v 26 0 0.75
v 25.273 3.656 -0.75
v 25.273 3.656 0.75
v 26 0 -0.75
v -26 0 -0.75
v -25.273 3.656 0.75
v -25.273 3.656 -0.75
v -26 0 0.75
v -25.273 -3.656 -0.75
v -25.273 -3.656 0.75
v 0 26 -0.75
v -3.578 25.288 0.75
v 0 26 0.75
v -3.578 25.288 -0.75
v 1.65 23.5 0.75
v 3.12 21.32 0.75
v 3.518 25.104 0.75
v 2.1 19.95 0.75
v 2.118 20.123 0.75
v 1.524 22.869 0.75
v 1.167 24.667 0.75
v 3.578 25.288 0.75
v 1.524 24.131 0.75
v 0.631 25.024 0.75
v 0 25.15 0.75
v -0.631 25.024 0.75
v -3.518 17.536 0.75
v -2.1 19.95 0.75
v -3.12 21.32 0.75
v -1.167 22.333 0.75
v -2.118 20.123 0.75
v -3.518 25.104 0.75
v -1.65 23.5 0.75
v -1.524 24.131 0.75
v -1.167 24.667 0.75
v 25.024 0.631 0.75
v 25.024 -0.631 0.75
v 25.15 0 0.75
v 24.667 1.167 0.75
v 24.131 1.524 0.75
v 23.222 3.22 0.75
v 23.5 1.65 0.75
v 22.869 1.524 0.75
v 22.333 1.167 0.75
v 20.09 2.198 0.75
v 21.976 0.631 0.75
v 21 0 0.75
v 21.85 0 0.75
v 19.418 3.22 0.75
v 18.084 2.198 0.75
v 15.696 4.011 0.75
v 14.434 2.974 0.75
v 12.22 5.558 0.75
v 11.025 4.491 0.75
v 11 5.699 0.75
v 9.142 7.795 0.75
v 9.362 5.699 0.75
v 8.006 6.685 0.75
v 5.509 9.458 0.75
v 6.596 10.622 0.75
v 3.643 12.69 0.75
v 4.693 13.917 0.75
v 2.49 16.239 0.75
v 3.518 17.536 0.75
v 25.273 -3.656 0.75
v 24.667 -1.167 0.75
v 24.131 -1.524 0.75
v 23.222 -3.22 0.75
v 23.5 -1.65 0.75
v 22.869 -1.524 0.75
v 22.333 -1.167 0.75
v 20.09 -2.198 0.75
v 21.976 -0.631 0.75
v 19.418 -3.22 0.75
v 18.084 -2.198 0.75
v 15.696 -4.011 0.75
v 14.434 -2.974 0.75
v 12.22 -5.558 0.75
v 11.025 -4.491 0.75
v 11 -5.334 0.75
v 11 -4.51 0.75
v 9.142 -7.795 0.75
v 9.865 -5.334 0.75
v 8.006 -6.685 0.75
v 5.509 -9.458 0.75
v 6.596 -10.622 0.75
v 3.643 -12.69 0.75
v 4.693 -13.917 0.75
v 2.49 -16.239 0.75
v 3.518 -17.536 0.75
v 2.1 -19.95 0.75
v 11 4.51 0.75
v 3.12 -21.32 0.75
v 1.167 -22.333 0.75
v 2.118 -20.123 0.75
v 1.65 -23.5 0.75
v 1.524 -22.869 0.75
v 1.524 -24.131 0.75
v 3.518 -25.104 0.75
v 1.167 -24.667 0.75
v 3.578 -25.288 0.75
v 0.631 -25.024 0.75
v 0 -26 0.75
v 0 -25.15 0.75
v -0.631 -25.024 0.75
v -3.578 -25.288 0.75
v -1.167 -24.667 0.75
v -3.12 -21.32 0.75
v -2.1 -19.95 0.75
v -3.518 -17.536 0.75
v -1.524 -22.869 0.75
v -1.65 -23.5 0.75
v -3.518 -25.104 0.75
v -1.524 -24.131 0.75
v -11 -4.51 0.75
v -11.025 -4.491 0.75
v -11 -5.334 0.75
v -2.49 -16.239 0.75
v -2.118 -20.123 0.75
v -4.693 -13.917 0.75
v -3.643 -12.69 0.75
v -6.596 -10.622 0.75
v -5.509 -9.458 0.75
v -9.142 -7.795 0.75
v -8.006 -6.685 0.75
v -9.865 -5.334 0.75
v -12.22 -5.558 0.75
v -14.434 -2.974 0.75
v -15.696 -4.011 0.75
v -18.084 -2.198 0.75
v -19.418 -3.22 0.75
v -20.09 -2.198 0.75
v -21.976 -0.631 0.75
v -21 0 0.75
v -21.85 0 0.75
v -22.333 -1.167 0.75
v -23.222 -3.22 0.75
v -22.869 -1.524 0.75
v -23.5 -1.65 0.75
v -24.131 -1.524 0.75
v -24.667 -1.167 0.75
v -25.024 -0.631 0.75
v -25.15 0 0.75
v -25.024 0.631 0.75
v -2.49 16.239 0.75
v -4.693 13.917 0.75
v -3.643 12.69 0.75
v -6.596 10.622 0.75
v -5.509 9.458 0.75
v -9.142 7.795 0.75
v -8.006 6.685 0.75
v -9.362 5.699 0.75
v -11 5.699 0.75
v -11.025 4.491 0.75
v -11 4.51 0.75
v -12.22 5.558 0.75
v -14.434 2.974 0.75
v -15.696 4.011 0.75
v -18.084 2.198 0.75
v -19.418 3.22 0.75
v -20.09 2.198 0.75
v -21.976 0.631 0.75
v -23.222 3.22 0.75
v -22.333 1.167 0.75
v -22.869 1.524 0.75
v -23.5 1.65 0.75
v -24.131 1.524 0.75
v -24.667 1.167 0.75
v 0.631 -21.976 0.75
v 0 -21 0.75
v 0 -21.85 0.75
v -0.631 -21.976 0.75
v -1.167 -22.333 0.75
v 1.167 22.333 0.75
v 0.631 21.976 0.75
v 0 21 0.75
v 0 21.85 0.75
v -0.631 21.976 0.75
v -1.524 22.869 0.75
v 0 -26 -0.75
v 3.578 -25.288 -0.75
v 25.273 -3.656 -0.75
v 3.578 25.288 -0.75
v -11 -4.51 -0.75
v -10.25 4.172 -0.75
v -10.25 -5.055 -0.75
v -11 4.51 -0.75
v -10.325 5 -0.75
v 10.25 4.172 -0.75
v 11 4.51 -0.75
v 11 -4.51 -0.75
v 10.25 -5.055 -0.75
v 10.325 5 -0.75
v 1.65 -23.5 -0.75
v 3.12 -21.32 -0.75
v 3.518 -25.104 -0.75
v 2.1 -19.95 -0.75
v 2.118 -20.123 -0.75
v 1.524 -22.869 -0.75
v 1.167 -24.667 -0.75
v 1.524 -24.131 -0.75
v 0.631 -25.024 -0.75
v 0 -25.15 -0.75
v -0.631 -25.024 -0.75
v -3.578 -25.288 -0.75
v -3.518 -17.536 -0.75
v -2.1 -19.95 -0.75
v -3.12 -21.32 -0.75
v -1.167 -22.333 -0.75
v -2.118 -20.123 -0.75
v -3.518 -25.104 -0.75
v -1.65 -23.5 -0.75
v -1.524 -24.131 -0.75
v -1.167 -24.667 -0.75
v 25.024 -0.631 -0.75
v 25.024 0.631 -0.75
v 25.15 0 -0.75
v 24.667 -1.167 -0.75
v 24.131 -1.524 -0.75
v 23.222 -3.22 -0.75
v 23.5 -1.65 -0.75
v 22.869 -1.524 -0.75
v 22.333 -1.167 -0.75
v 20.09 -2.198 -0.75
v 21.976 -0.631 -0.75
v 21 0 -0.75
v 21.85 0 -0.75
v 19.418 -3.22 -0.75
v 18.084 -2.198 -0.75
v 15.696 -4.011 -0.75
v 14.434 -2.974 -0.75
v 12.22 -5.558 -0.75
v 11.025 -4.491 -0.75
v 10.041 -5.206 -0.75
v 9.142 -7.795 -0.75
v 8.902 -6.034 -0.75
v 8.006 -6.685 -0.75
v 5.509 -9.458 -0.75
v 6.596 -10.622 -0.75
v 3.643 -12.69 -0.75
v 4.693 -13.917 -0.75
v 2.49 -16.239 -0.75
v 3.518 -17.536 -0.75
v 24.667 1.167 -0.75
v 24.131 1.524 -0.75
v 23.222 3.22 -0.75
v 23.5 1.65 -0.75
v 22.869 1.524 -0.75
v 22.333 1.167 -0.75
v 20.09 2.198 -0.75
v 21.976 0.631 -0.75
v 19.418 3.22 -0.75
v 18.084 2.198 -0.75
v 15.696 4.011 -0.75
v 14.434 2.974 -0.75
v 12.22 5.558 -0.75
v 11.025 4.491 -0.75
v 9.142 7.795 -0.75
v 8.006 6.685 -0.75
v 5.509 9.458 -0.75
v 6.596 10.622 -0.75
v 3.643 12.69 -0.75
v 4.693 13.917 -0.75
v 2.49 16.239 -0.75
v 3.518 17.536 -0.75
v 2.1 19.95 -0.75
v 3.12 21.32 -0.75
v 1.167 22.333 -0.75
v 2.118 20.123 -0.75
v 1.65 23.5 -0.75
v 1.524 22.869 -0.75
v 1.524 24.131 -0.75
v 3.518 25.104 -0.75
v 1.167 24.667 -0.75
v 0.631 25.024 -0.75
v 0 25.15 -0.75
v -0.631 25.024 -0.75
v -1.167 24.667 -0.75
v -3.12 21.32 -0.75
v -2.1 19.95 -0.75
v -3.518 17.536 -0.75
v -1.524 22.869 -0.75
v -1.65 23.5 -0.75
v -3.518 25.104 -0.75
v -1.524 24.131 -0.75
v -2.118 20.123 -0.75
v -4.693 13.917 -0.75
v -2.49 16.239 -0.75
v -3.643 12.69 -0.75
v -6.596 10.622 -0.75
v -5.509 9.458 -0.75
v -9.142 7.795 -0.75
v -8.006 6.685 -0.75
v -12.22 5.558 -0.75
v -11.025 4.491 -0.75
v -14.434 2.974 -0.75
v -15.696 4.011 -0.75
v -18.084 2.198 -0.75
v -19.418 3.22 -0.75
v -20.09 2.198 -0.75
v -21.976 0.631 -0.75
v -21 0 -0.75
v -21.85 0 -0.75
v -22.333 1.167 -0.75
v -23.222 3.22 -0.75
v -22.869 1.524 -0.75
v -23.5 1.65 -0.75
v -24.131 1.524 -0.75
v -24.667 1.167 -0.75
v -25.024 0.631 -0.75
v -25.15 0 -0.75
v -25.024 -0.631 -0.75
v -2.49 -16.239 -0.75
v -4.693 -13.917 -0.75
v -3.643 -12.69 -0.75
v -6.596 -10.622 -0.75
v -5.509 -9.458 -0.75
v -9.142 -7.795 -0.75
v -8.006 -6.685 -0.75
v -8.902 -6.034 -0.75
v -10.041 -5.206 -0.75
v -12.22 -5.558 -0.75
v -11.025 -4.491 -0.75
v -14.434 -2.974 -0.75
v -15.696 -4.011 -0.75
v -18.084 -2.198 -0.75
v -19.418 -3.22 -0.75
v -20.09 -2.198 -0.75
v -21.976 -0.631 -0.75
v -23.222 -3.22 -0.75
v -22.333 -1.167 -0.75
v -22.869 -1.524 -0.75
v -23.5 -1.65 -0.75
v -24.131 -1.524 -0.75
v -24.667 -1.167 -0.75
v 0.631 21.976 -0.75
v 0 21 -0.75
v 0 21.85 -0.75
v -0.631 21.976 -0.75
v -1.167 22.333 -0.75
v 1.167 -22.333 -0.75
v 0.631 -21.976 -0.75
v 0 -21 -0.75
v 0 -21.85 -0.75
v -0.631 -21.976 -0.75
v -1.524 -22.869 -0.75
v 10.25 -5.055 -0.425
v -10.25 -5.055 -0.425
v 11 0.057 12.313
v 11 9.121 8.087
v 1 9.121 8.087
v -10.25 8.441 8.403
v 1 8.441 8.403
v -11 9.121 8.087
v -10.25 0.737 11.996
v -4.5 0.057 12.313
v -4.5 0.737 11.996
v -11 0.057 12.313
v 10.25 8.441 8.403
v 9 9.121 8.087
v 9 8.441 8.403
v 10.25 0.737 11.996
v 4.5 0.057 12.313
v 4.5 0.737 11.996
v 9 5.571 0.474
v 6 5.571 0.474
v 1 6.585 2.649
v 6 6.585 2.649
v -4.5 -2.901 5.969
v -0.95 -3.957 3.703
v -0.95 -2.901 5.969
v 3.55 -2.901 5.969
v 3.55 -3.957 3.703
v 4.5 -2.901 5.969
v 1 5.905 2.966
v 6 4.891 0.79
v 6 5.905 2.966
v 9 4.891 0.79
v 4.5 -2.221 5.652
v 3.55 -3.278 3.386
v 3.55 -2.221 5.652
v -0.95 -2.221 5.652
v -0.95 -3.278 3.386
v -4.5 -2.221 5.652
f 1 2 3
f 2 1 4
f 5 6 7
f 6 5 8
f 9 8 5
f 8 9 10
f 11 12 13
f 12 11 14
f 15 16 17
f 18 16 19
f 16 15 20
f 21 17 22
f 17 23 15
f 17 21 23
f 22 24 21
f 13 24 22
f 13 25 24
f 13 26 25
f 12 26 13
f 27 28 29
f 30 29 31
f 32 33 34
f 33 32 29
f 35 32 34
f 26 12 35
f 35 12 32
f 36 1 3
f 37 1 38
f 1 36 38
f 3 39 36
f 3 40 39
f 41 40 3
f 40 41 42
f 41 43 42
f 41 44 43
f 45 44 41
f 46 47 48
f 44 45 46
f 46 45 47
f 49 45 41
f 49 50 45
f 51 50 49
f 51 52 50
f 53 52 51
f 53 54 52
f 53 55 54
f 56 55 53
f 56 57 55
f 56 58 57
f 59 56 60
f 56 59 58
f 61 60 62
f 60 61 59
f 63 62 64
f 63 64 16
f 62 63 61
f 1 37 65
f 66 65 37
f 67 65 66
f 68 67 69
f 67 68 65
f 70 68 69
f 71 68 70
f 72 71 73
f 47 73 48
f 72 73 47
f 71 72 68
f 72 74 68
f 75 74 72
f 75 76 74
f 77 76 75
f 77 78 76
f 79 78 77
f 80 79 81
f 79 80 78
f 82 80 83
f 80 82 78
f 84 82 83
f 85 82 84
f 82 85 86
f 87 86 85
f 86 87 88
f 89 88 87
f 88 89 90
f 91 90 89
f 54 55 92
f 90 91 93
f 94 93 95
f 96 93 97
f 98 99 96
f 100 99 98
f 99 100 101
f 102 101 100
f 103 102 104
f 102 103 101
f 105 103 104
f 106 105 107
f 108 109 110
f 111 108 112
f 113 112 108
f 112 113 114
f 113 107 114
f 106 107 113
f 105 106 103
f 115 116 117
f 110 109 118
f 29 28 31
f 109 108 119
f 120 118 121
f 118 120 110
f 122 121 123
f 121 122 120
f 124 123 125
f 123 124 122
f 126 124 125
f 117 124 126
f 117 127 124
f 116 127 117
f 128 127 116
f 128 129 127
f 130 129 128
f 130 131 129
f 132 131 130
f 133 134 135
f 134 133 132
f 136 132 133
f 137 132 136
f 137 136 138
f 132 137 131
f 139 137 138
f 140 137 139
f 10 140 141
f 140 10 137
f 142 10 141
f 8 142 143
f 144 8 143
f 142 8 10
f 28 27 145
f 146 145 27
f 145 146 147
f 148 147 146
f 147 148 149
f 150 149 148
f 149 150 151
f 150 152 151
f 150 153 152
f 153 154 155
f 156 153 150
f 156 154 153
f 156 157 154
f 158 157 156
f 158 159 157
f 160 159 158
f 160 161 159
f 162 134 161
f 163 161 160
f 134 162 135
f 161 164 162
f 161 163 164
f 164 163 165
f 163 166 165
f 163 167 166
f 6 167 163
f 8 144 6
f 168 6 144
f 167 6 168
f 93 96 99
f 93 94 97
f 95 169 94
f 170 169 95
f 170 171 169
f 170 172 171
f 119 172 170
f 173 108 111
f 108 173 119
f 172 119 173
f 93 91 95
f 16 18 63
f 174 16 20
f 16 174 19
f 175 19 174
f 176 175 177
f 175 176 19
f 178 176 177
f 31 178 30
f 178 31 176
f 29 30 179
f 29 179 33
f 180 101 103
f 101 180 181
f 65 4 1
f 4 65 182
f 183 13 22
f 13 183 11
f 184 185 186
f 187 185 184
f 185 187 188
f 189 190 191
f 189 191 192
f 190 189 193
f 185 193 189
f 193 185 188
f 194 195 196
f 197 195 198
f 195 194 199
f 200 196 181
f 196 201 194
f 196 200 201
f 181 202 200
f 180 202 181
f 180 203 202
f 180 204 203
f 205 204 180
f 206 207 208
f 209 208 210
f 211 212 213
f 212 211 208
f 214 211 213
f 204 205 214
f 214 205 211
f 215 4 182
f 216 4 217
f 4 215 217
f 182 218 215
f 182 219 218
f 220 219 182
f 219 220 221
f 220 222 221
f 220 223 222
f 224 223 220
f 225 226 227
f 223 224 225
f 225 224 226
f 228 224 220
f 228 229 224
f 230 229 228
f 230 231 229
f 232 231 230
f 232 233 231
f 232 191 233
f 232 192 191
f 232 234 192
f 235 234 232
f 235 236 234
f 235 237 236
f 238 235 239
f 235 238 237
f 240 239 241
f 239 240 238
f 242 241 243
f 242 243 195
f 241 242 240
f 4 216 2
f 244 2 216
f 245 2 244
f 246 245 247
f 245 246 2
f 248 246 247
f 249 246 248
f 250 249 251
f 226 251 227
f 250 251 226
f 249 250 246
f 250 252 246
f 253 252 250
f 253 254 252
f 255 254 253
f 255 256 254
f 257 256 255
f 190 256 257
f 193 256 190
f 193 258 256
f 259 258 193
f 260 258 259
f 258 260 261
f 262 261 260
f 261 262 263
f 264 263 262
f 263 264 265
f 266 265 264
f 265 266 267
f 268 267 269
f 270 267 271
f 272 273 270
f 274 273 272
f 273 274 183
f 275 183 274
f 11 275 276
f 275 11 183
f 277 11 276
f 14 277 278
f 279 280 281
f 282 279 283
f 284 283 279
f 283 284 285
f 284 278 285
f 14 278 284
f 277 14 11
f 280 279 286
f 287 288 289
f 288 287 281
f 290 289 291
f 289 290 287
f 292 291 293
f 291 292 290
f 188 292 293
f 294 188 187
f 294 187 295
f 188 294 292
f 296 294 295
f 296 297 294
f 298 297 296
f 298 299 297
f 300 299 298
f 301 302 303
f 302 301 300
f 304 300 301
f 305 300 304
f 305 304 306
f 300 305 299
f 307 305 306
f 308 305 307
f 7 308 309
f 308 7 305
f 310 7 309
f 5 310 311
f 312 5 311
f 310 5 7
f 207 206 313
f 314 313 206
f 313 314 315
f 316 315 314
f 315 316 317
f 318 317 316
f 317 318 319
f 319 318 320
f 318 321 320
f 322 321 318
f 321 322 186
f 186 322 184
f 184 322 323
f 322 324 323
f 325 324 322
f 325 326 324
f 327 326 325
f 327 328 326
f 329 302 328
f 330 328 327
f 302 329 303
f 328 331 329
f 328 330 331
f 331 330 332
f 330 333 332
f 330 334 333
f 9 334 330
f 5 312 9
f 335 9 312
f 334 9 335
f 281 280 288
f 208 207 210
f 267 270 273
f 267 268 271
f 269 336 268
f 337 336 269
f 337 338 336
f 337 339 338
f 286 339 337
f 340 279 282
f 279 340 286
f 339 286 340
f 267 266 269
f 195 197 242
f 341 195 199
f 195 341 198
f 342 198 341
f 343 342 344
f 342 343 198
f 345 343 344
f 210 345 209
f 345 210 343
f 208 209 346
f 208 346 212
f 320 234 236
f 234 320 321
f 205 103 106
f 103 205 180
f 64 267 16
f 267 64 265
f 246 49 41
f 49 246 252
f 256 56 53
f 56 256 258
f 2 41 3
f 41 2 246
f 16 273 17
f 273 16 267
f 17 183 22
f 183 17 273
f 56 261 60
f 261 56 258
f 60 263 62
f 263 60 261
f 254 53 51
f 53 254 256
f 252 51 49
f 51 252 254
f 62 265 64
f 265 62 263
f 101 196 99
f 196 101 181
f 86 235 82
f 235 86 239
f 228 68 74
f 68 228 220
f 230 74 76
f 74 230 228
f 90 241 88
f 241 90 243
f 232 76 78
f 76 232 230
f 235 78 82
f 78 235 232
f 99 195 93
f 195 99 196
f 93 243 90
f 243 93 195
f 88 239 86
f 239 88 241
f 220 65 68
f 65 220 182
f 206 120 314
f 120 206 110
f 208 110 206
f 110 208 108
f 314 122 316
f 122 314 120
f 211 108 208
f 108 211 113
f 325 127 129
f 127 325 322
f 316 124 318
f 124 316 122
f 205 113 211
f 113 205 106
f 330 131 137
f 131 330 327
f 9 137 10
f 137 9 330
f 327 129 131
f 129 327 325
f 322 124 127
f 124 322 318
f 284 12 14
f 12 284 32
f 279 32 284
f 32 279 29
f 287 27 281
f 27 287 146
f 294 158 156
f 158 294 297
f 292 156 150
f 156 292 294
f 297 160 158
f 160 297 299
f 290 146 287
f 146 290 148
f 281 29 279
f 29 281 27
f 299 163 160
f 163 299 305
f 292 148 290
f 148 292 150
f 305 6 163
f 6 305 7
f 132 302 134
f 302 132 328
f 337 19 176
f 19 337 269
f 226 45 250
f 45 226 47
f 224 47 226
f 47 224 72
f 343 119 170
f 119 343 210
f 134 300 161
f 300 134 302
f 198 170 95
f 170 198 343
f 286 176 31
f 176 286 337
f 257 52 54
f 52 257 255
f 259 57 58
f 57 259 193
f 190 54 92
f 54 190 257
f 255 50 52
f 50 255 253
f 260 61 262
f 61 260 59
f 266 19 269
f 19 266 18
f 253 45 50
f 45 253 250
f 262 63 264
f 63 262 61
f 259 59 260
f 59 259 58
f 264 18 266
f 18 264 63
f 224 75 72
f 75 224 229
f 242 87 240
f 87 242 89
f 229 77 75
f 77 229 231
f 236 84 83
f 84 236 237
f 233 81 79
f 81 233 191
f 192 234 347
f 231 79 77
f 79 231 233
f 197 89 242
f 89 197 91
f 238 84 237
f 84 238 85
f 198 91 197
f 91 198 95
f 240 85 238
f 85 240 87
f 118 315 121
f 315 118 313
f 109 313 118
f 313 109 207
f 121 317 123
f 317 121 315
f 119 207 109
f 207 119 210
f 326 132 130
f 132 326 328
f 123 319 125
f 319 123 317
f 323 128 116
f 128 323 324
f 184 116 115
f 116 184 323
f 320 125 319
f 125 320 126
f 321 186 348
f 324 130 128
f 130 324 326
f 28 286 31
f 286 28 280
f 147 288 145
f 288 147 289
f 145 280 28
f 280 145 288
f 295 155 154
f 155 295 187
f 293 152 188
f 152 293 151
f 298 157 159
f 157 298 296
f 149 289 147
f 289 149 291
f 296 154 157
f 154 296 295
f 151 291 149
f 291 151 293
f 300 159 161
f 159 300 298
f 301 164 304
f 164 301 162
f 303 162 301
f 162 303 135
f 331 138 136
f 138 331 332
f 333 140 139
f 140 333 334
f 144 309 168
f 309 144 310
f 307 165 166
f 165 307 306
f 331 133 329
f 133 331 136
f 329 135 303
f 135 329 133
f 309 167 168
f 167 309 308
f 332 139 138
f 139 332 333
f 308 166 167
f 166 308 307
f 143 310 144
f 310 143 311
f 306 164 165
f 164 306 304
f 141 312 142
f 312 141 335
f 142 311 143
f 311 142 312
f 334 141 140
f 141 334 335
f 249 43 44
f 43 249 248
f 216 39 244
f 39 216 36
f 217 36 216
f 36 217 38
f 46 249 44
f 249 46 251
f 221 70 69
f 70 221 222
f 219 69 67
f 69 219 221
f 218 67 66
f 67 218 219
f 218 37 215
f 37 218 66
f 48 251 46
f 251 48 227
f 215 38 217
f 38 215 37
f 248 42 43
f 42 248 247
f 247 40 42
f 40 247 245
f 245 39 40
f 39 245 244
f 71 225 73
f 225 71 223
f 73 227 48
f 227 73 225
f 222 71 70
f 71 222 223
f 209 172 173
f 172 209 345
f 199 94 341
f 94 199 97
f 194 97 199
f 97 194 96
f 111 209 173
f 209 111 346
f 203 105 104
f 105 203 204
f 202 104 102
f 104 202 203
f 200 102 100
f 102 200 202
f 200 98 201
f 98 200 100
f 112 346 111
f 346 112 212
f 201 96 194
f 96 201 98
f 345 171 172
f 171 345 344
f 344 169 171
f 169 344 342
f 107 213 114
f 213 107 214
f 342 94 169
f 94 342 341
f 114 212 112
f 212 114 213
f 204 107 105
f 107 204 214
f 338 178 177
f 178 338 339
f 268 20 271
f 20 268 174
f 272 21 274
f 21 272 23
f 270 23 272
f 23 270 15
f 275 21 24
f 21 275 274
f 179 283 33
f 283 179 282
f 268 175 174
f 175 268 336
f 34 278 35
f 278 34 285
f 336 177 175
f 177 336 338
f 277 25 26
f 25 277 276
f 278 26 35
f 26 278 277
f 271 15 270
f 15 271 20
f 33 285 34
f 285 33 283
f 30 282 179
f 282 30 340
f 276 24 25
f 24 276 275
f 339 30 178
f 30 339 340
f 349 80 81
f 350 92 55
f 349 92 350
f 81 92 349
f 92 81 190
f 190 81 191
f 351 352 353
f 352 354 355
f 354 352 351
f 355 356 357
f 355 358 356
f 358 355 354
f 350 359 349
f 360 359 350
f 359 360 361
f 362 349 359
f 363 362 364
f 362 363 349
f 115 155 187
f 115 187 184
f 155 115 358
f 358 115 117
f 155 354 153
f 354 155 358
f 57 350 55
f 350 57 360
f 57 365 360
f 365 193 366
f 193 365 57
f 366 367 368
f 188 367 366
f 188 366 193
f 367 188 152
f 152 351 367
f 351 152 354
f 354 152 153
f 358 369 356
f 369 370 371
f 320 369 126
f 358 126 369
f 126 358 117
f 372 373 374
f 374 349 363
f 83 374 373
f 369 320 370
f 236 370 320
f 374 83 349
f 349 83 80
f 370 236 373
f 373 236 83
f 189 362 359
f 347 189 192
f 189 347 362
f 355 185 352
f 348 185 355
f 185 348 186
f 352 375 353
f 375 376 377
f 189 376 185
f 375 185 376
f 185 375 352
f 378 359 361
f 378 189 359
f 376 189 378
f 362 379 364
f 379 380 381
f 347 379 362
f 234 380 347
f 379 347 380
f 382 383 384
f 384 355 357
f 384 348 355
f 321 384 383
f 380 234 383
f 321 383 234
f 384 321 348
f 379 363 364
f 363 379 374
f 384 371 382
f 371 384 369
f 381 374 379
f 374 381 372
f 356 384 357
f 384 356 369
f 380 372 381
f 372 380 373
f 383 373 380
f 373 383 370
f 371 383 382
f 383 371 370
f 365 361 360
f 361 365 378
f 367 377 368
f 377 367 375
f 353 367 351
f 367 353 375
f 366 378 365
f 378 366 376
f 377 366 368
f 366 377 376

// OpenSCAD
// Camera angle
CAMERA_ANGLE = 25;

module tx01_box(angle) {
  inner_width = 19;
  inner_depth = 8;
  height = 8;
  tx_box(19, 8, 8, angle);  
}

module tx03_box(angle) {
  inner_width = 20.5;
  inner_depth = 8.5;
  height = 9.75;
  tx_box(inner_width, inner_depth, height, angle);  
}

module tx_box(inner_width, inner_depth, height, angle) {
    
    wall_thickness = 1.5;
    
    width = inner_width + wall_thickness;
    depth = inner_depth + wall_thickness;
    
    extra_height = (angle + 1)/4;
    
    lens_width=9;
    lens_height=7;
    lens_x_offset = 0;
    lens_z_offset = 0;
    
    lcd_width=8;
    lcd_height=6;
    lcd_x_offset = 5;
    lcd_z_offset = 0;
    
    cap_width=4.5;
    cap_height=2;
    cap_x_offset = 1.3;
    cap_z_offset = 0;
    
    pcord_width=3;
    pcord_height=2.4;
    pcord_x_offset = 7.5;
    pcord_z_offset = 0;
    
    // center
    translate([-width/2, depth/2, -.75])
        difference() {
            // add camera angle
            rotate ([-angle, 0, 0])
                // rotate around rear edge
                translate([0, -depth, 0])
                    difference() {
                        // outer box
                        translate ([0, 0, -extra_height])
                            cube([width, depth, height + extra_height]);
                        // inner box
                        translate ([wall_thickness/2, wall_thickness/2, -extra_height - .5])
                            cube([inner_width, inner_depth, height + extra_height + 1]);
                        
                        // Lens cutout
                        lens_x = (width/2) - (lens_width/2) + lens_x_offset;
                        lens_z = height - lens_height + lens_z_offset;
                        translate ([lens_x, -.5, lens_z])
                            cube([lens_width, wall_thickness+1, lens_height]);
                        // Cap cutout
                        cap_x = (width/2) - (cap_width/2) + cap_x_offset;
                        cap_z = lens_z - cap_height + cap_z_offset;
                        translate ([cap_x, - .5, cap_z - .5])
                            cube([cap_width, wall_thickness + 1, cap_height + .5]);
                        
                        // LCD cutout
                        lcd_x = (width/2) - (lcd_width/2) + lcd_x_offset;
                        lcd_z = height - lcd_height + lcd_z_offset;
                        translate ([lcd_x, depth - wall_thickness + .5, lcd_z])
                            cube([lcd_width, wall_thickness + 1, lcd_height]);
                        // PowerCord cutout
                        pcord_x = (width/2) - (pcord_width/2) + pcord_x_offset;
                        pcord_z = lcd_z - pcord_height + pcord_z_offset;
                        translate ([pcord_x, depth - wall_thickness + .5, pcord_z])
                            cube([pcord_width, wall_thickness + 1, pcord_height]);
                        
                    }
            // cut bottom flat
            translate ([-1, -depth*3, -extra_height])
                cube([ width + 2, depth*3, extra_height]);
        }
}

module 1104_100_plate(hole_spacing, height) {
    
    r1 = (hole_spacing + 5) / 2.0;
    r1cut = 0.7 * r1;
    r1offset = 0.82 * r1;
    
    r2 = (hole_spacing - 5) / 2.0;
    r2cut = 0.85 * r2;
    r2offset = 0.95 * r2;
    
    rnut = 1.65;
    
    difference() {
        // Outer
        difference() {
            cylinder(r=r1, h=height, center=true, $fn=16);        
            translate([r1offset, r1offset, 0])
                cylinder(r=r1cut, h=4, center=true);
            translate([r1offset, -r1offset, 0])
                cylinder(r=r1cut, h=4, center=true);
            translate([-r1offset, -r1offset, 0])
                cylinder(r=r1cut, h=4, center=true);        
            translate([-r1offset, r1offset, 0])
                cylinder(r=r1cut, h=4, center=true);
        }
        
        // Inner
        difference() {
            cylinder(r=r2, h=2*height, center=true, $fn=8);        
            translate([r2offset, r2offset, 0])
                cylinder(r=r2cut, h=2*height, center=true);
            translate([r2offset, -r2offset, 0])
                cylinder(r=r2cut, h=2*height, center=true);
            translate([-r2offset, -r2offset, 0])
                cylinder(r=r2cut, h=2*height, center=true);        
            translate([-r2offset, r2offset, 0])
                cylinder(r=r2cut, h=2*height, center=true);
        }
        
       // M3 Holes
        translate([-hole_spacing / 2.0, 0, 0])        
            cylinder(r=rnut, h=2*height, center=true, $fn=16);
        translate([hole_spacing / 2.0, 0, 0])
            cylinder(r=rnut, h=2*height, center=true, $fn=16);
        translate([0, -hole_spacing / 2.0, 0])
            cylinder(r=rnut, h=2*height, center=true, $fn=16);
        translate([0, hole_spacing / 2.0, 0])
            cylinder(r=rnut, h=2*height, center=true, $fn=16);
    }
}

translate([0, 0, 0]) rotate([0, 0, 0]) 1104_100_plate(47, 1.5);
translate([0, 0, 0]) tx03_box(CAMERA_ANGLE);
